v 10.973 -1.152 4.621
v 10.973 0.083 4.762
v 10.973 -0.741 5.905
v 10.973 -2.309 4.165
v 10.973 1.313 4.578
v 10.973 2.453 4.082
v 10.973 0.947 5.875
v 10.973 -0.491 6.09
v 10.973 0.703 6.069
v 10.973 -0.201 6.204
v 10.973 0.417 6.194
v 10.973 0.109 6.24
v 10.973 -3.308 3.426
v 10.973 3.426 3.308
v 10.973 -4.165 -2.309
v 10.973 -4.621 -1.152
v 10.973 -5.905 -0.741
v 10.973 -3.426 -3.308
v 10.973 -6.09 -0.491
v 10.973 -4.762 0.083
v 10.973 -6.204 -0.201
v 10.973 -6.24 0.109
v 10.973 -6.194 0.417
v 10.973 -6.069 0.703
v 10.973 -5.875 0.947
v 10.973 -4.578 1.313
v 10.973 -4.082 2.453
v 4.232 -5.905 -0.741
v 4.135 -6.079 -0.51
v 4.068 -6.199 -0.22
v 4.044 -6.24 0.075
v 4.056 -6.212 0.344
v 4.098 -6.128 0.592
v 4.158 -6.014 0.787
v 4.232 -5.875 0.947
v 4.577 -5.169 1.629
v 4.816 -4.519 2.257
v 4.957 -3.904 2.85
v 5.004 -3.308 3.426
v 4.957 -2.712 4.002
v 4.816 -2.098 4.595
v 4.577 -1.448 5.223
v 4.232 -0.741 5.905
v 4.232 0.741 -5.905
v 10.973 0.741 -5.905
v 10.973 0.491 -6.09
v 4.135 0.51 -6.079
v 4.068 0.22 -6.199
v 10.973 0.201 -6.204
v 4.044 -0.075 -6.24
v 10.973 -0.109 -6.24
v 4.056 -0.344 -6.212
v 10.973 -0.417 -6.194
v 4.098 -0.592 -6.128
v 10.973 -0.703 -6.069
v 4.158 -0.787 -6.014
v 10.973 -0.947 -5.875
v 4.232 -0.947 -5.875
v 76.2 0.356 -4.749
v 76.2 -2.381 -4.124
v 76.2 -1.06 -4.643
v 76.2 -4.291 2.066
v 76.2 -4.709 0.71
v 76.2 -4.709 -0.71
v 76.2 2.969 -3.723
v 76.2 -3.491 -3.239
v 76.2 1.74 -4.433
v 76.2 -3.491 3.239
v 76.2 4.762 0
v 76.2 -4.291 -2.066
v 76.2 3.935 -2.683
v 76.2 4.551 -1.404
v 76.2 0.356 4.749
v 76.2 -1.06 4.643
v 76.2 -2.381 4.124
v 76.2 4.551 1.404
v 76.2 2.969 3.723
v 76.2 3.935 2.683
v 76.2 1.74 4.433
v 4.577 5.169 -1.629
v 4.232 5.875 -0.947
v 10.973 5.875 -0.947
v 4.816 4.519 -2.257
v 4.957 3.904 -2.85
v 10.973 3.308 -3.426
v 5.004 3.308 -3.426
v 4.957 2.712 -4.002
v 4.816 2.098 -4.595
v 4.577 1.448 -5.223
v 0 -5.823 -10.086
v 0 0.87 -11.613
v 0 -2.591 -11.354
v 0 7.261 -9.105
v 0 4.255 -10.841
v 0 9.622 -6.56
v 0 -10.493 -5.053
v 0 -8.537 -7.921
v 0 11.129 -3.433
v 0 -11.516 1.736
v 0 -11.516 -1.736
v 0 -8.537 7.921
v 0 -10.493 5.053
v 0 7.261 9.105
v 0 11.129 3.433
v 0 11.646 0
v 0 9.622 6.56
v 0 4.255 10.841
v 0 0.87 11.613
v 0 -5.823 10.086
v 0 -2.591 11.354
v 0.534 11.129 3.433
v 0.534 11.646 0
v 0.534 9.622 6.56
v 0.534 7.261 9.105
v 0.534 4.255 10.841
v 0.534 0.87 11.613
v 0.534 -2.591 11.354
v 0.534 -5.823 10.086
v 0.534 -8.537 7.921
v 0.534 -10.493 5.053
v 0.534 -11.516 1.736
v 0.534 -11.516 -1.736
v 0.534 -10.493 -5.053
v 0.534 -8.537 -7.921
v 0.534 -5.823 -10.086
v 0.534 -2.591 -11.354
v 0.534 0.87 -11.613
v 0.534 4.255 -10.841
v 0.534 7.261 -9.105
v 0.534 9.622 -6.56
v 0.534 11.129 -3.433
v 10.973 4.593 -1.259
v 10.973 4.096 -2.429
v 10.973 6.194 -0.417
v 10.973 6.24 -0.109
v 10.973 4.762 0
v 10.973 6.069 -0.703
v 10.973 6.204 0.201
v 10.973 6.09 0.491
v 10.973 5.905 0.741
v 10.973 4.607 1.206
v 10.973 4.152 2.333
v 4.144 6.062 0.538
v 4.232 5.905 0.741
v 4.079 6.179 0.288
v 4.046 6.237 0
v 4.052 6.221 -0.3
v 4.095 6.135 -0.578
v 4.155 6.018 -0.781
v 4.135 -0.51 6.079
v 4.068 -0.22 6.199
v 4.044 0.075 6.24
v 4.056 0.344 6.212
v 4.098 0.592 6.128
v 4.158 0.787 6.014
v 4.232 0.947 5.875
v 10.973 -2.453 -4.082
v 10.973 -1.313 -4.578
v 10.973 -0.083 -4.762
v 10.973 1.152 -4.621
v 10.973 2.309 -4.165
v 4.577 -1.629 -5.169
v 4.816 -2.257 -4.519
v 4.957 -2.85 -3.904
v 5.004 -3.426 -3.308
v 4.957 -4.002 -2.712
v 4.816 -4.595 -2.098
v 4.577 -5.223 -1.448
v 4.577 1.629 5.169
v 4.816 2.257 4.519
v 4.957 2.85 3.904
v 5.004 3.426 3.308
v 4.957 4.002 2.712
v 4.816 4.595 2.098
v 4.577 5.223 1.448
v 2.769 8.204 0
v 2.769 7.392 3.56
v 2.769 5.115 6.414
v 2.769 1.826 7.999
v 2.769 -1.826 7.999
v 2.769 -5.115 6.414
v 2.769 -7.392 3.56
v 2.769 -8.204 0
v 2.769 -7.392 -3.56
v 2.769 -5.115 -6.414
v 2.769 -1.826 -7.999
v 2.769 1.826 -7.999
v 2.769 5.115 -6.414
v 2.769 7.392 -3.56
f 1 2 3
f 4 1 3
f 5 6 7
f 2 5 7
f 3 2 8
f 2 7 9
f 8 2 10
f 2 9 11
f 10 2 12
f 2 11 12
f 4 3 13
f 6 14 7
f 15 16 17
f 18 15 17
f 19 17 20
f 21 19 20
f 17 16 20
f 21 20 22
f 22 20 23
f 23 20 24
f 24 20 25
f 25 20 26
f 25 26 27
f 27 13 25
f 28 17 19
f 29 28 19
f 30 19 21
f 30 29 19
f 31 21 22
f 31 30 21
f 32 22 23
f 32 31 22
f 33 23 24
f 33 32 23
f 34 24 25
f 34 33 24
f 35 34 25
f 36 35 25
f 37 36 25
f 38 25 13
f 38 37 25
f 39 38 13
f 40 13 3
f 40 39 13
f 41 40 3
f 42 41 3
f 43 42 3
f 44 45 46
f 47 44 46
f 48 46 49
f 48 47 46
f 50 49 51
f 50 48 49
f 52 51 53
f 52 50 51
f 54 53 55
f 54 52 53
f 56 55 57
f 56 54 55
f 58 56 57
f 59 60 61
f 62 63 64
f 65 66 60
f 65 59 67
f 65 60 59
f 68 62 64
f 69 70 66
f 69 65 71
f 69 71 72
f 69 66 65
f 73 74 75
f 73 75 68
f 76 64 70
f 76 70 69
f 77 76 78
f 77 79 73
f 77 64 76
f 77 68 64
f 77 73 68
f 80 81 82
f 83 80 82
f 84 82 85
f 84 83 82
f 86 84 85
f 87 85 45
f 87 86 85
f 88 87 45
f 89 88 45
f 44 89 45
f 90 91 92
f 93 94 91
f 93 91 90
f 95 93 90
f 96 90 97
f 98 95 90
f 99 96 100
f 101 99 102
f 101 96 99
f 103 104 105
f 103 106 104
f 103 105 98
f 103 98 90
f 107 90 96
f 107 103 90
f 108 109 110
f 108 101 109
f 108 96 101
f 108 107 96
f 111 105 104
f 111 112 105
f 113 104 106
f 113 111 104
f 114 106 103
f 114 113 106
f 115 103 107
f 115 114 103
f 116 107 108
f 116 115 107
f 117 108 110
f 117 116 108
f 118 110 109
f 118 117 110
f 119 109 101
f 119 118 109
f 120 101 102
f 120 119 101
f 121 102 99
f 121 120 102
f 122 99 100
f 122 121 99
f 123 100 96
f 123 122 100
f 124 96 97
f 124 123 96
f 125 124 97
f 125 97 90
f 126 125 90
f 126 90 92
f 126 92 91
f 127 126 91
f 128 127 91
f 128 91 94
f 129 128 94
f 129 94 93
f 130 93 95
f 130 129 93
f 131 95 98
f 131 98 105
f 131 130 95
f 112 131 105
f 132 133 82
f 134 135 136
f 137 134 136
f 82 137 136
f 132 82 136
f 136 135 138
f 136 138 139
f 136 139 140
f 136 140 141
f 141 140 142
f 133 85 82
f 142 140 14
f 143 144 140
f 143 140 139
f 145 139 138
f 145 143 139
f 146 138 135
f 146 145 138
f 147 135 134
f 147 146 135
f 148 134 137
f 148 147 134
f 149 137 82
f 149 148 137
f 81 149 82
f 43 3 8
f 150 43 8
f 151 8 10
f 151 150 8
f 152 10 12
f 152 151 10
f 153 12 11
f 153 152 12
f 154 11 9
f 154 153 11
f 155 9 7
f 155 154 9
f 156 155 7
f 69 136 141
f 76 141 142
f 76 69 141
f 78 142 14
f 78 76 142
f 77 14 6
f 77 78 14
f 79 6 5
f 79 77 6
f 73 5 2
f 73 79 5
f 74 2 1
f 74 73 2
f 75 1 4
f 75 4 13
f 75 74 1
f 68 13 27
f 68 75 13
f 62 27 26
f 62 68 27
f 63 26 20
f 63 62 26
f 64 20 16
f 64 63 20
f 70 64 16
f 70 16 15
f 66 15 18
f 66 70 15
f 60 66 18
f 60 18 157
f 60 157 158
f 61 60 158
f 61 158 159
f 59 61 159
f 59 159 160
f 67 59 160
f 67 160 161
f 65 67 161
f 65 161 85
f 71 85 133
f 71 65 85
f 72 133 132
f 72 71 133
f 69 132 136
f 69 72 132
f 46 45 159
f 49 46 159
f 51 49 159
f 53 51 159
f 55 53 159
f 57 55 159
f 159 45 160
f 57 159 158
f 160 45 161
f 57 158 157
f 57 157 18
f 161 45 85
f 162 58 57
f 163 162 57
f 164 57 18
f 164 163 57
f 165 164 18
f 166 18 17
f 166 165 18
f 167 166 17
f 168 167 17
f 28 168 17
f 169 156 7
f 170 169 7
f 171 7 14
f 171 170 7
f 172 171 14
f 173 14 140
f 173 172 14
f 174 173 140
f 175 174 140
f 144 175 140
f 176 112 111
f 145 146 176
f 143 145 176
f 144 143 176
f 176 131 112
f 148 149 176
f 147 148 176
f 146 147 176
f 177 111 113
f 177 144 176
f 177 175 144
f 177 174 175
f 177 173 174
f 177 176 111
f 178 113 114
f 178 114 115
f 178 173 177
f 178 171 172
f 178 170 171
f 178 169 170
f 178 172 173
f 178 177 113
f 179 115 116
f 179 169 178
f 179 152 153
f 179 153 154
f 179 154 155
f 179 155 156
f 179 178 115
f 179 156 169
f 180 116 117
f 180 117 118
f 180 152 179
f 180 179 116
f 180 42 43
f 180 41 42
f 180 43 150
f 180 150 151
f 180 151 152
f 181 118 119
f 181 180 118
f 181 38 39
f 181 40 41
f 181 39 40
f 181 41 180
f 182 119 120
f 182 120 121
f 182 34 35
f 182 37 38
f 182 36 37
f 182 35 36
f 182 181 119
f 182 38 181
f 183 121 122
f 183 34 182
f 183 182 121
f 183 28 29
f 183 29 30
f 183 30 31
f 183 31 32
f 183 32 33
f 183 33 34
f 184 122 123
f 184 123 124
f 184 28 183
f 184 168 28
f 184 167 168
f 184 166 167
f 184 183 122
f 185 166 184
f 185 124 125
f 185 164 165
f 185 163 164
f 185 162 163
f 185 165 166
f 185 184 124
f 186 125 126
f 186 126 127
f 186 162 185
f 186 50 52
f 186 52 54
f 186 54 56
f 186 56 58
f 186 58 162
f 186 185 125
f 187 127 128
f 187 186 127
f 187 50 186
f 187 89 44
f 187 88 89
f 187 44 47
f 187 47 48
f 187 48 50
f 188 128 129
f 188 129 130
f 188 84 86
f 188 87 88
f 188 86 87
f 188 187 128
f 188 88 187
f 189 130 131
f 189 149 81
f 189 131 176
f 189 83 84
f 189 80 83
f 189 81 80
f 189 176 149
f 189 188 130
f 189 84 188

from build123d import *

# Parameters (mm, degrees)
NECK_DEPTH = 10.9728


# Read off the part's stored shape, not the designer's step: Cut-Revolve1
with BuildPart() as part:
    # Cut-Revolve1 outline → Cut-Revolve1 (revolve)
    with BuildSketch(Plane.YX):
        Polygon((0, 76.2), (0, 0), (11.6459, 0), (11.6459, 0.533667773), (4.7625, 5.0038), (4.7625, 76.2), align=None)
    revolve(axis=Axis((0, 0, 0), (1, 0, 0)))

    # Sketch2 → Neck (add)
    with BuildSketch(Plane(origin=(0, 0, 0), x_dir=(0, 0.6946583704589985, -0.7193398003386501), z_dir=(1, 0, 0))):
        with BuildLine():
            Line((3.5687, -4.7625), (-3.5687, -4.7625))
            ThreePointArc((-3.5687, -4.7625), (-4.412844075, -4.412844075), (-4.7625, -3.5687))
            Line((-4.7625, -3.5687), (-4.7625, 3.5687))
            ThreePointArc((-4.7625, 3.5687), (-4.412844075, 4.412844075), (-3.5687, 4.7625))
            Line((-3.5687, 4.7625), (3.5687, 4.7625))
            ThreePointArc((3.5687, 4.7625), (4.412844075, 4.412844075), (4.7625, 3.5687))
            Line((4.7625, 3.5687), (4.7625, -3.5687))
            ThreePointArc((4.7625, -3.5687), (4.412844075, -4.412844075), (3.5687, -4.7625))
        make_face()
    extrude(amount=NECK_DEPTH)


solid = part.part
